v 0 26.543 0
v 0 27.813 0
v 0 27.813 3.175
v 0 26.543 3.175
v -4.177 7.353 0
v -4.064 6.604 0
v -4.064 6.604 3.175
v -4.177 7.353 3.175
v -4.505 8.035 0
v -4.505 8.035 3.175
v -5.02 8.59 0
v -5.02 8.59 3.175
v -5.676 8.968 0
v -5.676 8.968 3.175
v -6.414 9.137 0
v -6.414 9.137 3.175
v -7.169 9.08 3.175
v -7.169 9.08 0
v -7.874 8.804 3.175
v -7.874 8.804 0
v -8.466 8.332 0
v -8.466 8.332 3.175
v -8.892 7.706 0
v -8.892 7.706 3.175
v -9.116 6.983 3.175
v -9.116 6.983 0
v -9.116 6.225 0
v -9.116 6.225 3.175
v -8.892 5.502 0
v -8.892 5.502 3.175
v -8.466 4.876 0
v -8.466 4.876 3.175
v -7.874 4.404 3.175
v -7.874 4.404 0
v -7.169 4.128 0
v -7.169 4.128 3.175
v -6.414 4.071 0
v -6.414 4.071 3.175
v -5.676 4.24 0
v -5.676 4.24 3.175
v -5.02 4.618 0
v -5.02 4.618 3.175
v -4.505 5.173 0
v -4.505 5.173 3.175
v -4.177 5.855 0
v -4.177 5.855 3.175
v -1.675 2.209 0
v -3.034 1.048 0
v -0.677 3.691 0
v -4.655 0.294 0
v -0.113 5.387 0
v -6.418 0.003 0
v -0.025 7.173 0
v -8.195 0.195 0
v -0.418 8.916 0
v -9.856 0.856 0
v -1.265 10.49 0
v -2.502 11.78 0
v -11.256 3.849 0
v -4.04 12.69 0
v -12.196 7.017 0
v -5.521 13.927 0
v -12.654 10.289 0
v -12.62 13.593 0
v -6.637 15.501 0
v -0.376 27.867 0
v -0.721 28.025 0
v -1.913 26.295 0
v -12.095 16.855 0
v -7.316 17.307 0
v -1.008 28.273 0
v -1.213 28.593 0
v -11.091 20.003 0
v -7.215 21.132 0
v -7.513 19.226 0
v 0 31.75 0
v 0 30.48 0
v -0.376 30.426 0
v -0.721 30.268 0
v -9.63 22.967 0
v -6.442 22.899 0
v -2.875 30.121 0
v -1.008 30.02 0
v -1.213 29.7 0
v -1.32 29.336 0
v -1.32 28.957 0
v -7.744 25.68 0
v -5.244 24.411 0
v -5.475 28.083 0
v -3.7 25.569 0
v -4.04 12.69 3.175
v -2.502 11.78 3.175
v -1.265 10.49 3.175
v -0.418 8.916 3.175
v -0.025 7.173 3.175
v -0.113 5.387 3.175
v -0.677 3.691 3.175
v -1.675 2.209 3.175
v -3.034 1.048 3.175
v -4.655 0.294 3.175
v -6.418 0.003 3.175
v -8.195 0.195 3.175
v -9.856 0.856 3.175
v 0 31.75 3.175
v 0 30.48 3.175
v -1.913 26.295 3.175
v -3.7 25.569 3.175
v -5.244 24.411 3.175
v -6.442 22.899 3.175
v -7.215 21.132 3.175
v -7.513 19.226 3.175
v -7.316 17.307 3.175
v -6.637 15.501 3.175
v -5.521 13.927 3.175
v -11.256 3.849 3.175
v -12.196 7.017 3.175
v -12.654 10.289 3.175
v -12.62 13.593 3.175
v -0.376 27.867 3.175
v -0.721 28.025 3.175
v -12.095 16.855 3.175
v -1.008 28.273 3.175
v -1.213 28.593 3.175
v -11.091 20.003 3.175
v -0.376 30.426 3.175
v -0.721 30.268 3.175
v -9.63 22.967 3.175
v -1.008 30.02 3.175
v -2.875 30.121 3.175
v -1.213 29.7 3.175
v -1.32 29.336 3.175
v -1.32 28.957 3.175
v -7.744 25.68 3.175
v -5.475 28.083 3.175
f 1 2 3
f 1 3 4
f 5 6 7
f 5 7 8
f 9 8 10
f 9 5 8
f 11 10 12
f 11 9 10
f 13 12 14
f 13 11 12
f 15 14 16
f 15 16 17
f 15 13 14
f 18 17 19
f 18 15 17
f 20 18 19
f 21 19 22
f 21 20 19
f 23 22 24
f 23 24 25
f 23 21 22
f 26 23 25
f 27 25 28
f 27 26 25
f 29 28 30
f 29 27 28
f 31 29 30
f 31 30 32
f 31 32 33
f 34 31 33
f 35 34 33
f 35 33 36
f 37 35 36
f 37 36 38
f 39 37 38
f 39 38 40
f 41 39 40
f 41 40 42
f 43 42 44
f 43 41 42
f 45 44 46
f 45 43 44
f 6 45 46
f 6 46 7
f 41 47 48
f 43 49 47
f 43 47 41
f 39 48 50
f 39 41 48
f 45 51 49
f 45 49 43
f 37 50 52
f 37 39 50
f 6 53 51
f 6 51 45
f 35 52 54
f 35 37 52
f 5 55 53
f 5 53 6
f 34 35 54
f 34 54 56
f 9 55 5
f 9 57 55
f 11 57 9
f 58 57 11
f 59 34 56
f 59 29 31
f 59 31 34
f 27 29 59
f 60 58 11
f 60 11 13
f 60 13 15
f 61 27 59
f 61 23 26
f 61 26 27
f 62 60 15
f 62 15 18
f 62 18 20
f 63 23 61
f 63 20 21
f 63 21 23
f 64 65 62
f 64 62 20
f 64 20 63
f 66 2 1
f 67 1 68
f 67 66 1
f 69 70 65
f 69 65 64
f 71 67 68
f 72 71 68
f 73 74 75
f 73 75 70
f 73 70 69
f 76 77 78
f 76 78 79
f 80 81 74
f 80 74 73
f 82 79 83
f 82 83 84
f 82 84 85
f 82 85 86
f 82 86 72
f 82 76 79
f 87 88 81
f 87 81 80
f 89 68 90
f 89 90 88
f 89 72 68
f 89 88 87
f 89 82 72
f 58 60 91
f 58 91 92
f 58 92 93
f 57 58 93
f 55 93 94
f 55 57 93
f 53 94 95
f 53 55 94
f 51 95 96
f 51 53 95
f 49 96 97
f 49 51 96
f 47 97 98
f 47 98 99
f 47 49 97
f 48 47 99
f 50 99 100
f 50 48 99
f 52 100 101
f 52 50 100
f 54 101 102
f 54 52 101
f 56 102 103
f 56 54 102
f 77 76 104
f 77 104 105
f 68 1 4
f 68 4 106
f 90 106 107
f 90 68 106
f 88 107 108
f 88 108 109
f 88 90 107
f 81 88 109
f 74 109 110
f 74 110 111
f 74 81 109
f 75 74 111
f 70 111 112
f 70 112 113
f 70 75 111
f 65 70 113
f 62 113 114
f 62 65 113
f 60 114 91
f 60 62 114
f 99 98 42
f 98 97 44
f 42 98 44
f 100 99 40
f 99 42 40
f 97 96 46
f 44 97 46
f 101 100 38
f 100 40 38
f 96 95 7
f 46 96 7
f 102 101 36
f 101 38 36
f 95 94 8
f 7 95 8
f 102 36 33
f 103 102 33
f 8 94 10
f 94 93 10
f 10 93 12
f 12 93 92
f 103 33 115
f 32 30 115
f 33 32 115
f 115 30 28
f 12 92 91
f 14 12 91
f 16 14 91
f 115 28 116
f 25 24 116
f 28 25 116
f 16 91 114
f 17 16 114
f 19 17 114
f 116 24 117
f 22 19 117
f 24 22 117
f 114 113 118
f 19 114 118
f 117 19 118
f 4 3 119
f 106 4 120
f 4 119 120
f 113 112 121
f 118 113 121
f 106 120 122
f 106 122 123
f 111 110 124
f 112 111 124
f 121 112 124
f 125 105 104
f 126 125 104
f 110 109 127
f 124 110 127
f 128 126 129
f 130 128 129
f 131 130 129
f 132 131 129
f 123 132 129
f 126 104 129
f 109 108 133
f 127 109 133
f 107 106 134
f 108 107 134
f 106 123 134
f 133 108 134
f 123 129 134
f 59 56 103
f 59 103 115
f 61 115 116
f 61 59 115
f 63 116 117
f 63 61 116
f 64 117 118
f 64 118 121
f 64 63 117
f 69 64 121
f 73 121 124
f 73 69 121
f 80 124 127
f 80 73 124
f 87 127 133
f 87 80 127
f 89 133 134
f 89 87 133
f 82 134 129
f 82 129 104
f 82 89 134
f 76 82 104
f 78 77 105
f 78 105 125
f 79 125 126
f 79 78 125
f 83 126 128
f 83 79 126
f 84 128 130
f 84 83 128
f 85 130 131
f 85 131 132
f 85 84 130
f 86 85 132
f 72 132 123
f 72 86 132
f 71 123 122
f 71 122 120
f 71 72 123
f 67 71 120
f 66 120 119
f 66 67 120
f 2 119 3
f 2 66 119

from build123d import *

# Parameters (mm, degrees)
SKETCH1_R           = 2.54
BOSS_EXTRUDE1_DEPTH = 3.175


with BuildPart() as part:
    # Sketch1 → Boss-Extrude1 (new body)
    with BuildSketch(Plane.XY):
        with BuildLine():
            Line((0, 27.813), (0, 26.543))
            ThreePointArc((0, 26.543), (-7.215038926, 21.131730585), (-4.040445833, 12.690132272))
            ThreePointArc((-4.040445833, 12.690132272), (-0.676998183, 3.691361084), (-9.855894217, 0.856130829))
            ThreePointArc((-9.855894217, 0.856130829), (-11.652031758, 18.448211646), (0, 31.75))
            Line((0, 31.75), (0, 30.48))
            ThreePointArc((0, 30.48), (-1.3335, 29.1465), (0, 27.813))
        make_face()
        with Locations((-6.604, 6.604)):
            Circle(SKETCH1_R, mode=Mode.SUBTRACT)
    extrude(amount=BOSS_EXTRUDE1_DEPTH)


solid = part.part
